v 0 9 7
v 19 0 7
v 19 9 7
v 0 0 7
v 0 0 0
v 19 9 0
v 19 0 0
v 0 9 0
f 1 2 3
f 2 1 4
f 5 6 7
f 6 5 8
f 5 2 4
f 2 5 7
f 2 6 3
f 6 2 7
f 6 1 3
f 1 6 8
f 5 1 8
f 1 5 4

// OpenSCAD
// Generated by SolidPython 1.0.1 on 2020-07-29 00:46:56


cube(size = [19, 9, 7]);
/***********************************************
*********      SolidPython code:      **********
************************************************
 
# import packages: SolidPython
from solid import *
from solid.utils import *
from itertools import chain, combinations, permutations


class Resize:

    def __init__(self, scad_file):
        self.scad_file = scad_file
        #self.scad_file = import_scad(scad_file)
        # cone/cylinder param:
        self.r1 = 0
        self.r2 = 0
        self.h = 0
        # rectangular prism param:
        self.w = 0
        self.l = 0
        # ellipse param:
        self.r = 0

    # import OpenScad code (file name corresponds to shape)


    # classify shape + parameters
    def assign(self, param1, param2, param3):
        if self.scad_file == 'cone.scad':
            self.r1 = param1
            self.r2 = param2
            self.h = param3
        elif self.scad_file == 'cylinder.scad':
            self.r1 = param1
            self.r2 = param2
            self.h = param3
        elif self.scad_file == 'rectangularPrism.scad':
            self.h = param1
            self.l = param2
            self.w = param3
        else:
            self.r = param1
            self.h = param2

    # resize parameters
    def iterate(self):
        x = range(3, 20, 2)
        i = 1
        if self.scad_file == 'cone.scad':
            tempList = list(permutations(x, 2))
            for temp in tempList:
                param1 = temp[0]
                param2 = temp[1]
                filepath = 'produced_scad_files/' + 'cone' + str(param1) + '_' + str(param2) + '_' + '.scad'
                scad_render_to_file(cylinder(h=param1, r1=param2, r2=0), filepath)

        elif self.scad_file == 'cylinder.scad':
            tempList = list(permutations(x, 3))
            for temp in tempList:
                param1 = temp[0]
                param2 = temp[1]
                filepath = 'produced_scad_files/' + 'cylinder' + str(param1) + '_' + str(param2) + '_' + '.scad'
                scad_render_to_file(cylinder(h=param1, r1=param2, r2=param2), filepath)

        elif self.scad_file == 'rectangularPrism.scad':
            tempList = list(permutations(x, 3))
            for temp in tempList:
                param1 = temp[0]
                param2 = temp[1]
                param3 = temp[2]
                filepath = 'produced_scad_files/' + 'rectangularPrism' + str(param1) + '_' + str(param2) + '_' + str(
                    param3) + '.scad'
                scad_render_to_file(cube(size=(param1, param2, param3)), filepath)

        elif self.scad_file == 'ellipse.scad':
            tempList = list(permutations(x, 4))
            for temp in tempList:
                param1 = temp[0]
                param2 = temp[1]
                param3 = temp[2]
                param4 = temp[3]
                filepath = 'produced_scad_files/' + 'ellipse' + str(param1) + '_' + str(param2) + '_' + str(param3) + '_' + str(param4) + '.scad'
                scad_render_to_file(scale([param1, param2, param3])(sphere(r=param4)), filepath)

    def render_to_scadfile(self):
        scad_render_to_file(scad, 'example.scad') 
 
************************************************/
